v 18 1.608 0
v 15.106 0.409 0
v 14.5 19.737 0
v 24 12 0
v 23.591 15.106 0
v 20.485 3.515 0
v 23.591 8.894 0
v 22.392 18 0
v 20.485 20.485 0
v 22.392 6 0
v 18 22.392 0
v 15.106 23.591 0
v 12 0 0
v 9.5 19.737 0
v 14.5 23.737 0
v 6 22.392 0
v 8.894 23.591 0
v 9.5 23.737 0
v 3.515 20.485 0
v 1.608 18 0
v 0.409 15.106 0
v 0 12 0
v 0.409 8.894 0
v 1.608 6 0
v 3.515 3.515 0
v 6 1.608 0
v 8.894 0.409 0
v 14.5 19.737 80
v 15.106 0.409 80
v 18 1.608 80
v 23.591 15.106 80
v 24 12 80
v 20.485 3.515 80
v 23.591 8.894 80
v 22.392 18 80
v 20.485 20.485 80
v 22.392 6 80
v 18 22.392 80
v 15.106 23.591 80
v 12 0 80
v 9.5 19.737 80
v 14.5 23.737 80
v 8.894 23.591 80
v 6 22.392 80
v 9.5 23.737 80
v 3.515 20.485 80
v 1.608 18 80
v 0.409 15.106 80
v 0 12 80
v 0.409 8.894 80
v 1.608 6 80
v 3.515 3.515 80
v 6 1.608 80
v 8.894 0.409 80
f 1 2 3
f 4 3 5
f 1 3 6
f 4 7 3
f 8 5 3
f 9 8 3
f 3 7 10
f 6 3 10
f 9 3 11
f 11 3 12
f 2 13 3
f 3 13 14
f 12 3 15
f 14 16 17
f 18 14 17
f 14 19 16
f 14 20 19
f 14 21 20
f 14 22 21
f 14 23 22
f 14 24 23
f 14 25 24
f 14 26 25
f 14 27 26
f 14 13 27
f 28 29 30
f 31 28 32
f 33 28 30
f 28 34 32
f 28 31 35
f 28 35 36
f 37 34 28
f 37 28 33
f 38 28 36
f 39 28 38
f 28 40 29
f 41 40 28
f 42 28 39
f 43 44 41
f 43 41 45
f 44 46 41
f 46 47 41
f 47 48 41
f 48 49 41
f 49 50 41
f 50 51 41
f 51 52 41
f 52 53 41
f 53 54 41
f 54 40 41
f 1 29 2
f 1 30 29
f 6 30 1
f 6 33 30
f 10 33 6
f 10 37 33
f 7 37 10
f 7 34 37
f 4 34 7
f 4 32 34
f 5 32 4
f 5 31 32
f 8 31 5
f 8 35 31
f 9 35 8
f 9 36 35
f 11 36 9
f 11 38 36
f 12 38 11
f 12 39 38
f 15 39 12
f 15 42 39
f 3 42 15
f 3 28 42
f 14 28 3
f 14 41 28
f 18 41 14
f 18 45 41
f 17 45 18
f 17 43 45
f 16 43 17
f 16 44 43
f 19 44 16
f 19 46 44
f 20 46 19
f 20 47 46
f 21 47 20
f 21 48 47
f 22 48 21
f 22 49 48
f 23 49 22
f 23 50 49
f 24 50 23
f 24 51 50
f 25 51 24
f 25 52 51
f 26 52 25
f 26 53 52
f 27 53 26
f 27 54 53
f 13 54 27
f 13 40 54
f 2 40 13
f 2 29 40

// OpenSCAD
$fn = 32;

// ----------------------------------------------------------------------
// Keyway shaft: d24 shaft, key 5 x 4 mm
// ----------------------------------------------------------------------

// --- parameters (mm) ---
shaft_r = 12;             // shaft radius
key_w = 5;                // keyway width
key_d = 4;                // keyway depth below the surface line
plate_t = 80;             // shaft length, Z (extrusion height)

shaft_d = 2 * shaft_r;  // shaft diameter
circle_step = 15;  // polygon sampling step, degrees

profile = [[8.894, 23.591], [6, 22.392], [3.515, 20.485], [1.608, 18], [0.409, 15.106], [0, 12], [0.409, 8.894], [1.608, 6], [3.515, 3.515], [6, 1.608], [8.894, 0.409], [12, 0], [15.106, 0.409], [18, 1.608], [20.485, 3.515], [22.392, 6], [23.591, 8.894], [24, 12], [23.591, 15.106], [22.392, 18], [20.485, 20.485], [18, 22.392], [15.106, 23.591], [14.5, 23.737], [14.5, 19.737], [9.5, 19.737], [9.5, 23.737]];  // primary outline, 27 points, counter clockwise

// --- the one profile operation ---
linear_extrude(height = plate_t) polygon(points = profile);
